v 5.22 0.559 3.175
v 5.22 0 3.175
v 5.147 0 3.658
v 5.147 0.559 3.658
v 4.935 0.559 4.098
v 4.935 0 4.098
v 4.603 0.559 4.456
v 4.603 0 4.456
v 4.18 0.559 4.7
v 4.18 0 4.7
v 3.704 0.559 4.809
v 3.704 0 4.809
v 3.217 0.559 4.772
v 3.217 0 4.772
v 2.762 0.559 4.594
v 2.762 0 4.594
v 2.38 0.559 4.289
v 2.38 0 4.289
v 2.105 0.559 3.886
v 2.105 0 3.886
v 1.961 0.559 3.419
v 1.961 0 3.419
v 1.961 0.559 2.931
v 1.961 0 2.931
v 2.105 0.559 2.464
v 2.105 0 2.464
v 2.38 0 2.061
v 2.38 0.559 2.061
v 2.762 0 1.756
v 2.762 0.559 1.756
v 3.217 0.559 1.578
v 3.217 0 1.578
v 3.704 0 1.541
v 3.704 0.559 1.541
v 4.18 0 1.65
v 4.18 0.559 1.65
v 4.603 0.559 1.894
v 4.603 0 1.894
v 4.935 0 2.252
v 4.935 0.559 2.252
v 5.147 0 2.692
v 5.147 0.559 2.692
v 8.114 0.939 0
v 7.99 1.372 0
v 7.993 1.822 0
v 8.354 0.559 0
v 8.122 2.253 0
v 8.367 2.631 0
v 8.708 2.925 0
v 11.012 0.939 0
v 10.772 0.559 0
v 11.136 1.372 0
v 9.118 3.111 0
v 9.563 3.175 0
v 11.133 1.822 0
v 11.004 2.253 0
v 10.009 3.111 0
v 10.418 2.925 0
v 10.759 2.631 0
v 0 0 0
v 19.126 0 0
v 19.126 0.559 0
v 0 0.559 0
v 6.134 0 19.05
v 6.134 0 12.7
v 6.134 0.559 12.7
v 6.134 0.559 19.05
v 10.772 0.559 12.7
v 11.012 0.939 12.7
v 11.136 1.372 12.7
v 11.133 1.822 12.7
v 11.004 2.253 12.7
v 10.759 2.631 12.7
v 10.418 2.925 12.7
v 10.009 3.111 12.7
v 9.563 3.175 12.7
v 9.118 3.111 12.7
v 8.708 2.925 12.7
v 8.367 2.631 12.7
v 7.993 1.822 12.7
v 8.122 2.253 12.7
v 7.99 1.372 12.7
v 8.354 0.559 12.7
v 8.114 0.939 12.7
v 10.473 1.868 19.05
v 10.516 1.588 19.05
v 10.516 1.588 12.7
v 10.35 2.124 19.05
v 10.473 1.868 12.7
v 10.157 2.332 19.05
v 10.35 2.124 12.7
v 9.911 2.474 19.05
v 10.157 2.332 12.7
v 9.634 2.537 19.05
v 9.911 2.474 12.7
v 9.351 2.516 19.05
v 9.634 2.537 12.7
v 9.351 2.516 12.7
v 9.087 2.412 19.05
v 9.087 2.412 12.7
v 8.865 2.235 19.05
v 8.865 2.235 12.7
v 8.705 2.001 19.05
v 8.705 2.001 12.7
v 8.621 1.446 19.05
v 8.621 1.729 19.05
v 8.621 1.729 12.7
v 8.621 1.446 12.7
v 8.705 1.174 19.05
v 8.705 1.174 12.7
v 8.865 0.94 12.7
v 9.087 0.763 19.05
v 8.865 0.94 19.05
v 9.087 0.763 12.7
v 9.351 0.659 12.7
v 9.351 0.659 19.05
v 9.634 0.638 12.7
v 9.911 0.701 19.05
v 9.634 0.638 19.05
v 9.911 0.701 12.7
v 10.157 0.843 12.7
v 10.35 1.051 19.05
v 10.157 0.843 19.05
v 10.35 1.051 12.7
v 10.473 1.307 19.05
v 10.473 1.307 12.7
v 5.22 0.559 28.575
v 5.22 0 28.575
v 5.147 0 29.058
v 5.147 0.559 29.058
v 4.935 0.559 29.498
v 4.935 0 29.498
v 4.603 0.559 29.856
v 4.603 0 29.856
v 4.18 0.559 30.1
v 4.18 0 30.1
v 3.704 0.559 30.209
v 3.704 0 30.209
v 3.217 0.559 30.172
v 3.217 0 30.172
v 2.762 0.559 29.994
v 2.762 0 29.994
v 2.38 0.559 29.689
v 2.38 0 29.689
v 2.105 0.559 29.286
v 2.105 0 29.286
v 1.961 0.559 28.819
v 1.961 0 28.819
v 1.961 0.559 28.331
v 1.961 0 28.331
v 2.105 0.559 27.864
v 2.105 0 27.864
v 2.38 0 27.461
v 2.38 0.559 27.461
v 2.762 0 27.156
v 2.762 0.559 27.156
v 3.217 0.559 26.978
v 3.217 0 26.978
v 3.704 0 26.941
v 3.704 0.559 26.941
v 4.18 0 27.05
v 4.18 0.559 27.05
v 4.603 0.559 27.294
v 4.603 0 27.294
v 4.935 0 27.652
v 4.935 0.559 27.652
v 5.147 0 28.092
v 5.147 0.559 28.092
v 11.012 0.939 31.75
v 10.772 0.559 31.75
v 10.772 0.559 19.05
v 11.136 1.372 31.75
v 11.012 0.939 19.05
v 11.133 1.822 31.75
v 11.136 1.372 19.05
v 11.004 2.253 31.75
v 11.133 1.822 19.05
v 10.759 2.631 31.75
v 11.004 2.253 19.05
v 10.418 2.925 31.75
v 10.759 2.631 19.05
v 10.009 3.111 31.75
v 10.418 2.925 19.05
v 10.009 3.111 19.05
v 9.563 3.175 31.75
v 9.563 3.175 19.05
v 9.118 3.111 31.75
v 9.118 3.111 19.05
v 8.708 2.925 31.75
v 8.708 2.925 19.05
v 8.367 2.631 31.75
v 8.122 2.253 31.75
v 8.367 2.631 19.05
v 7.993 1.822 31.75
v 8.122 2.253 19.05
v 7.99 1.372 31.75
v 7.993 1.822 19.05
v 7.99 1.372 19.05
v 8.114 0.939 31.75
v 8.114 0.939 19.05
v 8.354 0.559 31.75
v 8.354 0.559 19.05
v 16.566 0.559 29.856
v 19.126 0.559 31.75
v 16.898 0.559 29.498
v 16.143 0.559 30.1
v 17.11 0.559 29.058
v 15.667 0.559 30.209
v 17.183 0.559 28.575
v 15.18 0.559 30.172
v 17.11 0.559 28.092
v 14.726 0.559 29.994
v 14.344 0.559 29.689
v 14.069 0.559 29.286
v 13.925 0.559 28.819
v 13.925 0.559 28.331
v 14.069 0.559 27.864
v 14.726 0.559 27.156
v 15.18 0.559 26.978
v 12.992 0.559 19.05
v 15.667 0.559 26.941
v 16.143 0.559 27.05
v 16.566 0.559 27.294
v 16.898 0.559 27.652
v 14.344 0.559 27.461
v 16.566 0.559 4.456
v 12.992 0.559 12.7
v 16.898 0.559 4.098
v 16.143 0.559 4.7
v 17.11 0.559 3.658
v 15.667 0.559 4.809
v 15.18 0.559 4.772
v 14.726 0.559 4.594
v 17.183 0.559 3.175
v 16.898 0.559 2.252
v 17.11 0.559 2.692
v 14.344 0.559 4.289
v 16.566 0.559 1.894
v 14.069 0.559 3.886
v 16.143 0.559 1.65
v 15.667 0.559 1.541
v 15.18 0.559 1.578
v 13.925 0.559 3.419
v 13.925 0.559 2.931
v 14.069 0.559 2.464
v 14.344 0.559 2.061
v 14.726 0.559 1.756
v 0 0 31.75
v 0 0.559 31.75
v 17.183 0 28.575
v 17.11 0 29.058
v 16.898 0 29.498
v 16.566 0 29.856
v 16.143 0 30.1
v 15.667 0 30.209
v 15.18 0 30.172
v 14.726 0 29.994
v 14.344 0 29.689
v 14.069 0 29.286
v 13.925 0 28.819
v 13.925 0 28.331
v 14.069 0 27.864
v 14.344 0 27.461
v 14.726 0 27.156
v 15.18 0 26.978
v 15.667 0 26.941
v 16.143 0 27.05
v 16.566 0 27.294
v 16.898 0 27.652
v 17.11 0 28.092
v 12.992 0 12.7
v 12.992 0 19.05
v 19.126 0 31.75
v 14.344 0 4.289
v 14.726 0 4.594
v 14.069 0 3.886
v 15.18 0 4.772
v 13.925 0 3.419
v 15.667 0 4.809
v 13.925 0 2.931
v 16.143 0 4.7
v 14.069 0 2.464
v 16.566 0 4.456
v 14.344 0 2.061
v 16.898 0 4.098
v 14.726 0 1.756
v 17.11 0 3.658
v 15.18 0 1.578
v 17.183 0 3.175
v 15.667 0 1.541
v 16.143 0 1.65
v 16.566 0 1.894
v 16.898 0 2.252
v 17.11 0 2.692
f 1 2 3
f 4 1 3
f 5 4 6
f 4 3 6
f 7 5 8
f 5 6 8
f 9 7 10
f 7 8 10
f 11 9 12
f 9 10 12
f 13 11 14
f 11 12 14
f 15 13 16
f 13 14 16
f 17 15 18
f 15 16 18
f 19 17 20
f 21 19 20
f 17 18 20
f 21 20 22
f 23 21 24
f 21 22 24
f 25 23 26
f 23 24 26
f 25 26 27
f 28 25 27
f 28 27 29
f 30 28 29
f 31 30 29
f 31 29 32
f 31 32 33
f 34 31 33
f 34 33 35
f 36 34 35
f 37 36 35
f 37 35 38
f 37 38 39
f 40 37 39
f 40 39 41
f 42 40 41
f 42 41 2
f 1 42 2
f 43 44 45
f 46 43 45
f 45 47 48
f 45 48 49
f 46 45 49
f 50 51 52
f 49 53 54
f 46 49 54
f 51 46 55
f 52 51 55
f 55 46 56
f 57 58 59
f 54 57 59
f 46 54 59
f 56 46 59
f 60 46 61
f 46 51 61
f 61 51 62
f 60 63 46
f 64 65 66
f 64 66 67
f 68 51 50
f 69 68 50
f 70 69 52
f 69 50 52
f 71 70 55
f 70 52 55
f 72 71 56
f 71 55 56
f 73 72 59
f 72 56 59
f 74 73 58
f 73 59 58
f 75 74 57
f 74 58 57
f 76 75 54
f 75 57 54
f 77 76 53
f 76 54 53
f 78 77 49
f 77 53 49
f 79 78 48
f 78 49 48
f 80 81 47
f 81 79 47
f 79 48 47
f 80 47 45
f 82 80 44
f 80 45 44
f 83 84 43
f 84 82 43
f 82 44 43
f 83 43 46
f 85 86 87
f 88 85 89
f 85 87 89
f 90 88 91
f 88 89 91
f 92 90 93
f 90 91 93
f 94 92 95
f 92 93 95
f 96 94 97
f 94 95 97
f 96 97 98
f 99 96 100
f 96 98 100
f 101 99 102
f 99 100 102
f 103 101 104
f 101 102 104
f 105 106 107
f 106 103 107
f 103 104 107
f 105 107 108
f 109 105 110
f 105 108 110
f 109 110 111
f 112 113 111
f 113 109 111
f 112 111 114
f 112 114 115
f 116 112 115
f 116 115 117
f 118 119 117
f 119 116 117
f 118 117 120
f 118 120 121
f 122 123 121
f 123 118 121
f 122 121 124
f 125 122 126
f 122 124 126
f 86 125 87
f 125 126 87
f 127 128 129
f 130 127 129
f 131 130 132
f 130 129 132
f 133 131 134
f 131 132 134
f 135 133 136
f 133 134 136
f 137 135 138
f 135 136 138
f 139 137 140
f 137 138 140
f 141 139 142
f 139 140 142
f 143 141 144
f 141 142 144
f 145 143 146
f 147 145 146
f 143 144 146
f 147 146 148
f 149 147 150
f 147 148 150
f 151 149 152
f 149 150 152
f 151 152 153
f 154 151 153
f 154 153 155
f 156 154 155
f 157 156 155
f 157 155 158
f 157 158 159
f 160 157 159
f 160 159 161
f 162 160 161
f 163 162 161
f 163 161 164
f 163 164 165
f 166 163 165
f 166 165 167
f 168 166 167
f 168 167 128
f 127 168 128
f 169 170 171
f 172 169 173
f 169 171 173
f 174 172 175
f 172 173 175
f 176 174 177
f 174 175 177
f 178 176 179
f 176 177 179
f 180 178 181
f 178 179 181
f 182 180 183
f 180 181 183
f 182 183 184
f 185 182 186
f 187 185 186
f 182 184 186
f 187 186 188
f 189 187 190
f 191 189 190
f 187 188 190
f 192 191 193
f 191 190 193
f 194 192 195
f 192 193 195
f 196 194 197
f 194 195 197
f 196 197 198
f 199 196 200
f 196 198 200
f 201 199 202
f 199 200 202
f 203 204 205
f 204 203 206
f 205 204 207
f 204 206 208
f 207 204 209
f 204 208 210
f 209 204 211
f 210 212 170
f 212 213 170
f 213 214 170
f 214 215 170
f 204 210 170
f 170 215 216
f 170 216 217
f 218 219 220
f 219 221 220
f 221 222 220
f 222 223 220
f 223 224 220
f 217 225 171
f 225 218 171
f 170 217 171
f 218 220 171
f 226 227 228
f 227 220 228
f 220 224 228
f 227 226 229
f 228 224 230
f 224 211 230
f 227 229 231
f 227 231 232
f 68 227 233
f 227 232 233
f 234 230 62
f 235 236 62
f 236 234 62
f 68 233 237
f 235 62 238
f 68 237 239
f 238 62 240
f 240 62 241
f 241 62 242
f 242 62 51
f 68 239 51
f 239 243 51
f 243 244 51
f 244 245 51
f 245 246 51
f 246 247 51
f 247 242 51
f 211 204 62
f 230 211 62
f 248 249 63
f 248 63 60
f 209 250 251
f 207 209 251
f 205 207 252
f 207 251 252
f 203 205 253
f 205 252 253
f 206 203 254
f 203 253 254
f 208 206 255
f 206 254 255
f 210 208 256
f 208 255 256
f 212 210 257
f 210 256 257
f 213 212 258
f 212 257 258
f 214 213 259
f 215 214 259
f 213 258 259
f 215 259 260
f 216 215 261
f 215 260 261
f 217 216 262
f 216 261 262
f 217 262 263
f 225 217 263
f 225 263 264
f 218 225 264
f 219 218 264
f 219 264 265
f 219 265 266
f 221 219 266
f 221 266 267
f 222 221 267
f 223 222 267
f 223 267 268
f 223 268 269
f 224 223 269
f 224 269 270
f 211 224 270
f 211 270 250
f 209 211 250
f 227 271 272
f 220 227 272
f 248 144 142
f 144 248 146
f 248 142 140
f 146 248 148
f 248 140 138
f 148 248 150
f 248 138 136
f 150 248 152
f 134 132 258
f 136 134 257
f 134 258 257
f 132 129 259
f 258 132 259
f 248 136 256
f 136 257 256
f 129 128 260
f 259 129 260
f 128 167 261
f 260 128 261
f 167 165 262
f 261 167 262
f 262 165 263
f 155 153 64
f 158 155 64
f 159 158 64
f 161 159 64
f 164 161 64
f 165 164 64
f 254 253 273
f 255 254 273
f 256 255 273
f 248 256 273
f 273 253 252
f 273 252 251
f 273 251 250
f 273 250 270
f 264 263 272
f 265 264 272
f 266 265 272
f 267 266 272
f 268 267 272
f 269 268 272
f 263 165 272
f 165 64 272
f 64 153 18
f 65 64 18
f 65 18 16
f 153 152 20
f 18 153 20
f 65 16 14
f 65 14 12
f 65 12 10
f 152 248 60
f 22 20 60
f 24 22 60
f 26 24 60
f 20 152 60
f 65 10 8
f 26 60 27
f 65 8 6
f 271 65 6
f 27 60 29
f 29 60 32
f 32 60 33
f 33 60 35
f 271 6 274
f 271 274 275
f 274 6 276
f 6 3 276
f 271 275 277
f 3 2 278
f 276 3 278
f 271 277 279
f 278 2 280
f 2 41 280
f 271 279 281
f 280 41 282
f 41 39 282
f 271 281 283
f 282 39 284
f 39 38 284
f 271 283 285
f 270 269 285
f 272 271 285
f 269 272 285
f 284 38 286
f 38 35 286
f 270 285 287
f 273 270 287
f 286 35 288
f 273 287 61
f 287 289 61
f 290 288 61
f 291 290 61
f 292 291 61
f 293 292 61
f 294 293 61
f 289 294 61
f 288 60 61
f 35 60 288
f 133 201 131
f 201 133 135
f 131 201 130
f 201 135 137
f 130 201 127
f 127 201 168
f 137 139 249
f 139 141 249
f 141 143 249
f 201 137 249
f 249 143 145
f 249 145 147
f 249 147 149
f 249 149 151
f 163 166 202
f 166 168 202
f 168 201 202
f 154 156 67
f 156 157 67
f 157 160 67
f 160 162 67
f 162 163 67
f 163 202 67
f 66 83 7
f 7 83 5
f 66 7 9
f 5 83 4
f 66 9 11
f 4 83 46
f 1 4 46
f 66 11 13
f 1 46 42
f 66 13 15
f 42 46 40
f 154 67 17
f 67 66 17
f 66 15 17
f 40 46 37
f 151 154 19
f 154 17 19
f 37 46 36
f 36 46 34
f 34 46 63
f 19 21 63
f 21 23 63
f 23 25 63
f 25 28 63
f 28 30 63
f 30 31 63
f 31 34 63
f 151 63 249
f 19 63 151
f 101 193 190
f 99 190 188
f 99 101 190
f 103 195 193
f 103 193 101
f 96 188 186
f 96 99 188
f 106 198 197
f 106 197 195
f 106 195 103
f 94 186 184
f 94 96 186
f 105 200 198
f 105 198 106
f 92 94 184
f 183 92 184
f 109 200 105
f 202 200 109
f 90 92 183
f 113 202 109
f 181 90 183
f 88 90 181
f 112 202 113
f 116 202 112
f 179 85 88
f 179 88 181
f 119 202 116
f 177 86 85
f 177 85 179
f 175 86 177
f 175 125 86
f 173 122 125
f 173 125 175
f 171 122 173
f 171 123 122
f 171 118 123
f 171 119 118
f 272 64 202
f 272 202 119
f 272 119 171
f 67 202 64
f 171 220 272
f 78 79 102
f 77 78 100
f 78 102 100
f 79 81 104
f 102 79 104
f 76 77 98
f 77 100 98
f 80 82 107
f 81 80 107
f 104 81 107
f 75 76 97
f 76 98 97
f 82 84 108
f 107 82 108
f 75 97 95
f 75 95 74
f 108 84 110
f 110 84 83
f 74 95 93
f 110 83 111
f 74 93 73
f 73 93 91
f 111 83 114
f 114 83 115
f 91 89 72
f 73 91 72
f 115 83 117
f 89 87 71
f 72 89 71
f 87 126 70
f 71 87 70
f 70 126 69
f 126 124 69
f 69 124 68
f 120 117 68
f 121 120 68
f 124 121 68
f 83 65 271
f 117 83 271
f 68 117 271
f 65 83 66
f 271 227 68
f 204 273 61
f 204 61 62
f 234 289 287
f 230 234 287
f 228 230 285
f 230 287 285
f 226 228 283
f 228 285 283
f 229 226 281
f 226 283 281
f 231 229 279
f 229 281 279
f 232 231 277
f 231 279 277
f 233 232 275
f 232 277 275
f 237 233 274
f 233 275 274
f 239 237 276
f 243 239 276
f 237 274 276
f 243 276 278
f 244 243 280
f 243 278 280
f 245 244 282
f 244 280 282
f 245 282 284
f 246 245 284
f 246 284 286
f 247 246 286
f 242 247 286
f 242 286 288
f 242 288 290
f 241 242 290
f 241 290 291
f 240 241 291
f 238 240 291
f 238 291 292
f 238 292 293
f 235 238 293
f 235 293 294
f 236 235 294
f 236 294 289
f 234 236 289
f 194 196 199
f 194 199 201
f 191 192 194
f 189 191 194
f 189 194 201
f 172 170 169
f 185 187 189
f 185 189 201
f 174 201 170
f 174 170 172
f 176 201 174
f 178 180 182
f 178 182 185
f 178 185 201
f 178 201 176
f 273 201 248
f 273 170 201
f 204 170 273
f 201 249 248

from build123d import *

# Parameters (mm, degrees)
BOSS_EXTRUDE1_DEPTH = 31.75
SKETCH3_W           = 6.858
SKETCH3_H           = 6.35
SKETCH3_R           = 1.6383
CUT_EXTRUDE1_DEPTH  = 4.175
BOSS_EXTRUDE2_REACH = 21.05
SKETCH4_R           = 0.9525


with BuildPart() as part:
    # Sketch1 → Boss-Extrude1 (new body)
    with BuildSketch(Plane.XY):
        with BuildLine():
            Line((0, 0), (19.1262, 0))
            Line((19.1262, 0), (19.1262, 0.5588))
            Line((19.1262, 0.5588), (10.772204032, 0.5588))
            ThreePointArc((10.772204032, 0.5588), (9.5631, 3.175), (8.353995968, 0.5588))
            Line((8.353995968, 0.5588), (0, 0.5588))
            Line((0, 0.5588), (0, 0))
        make_face()
    extrude(amount=BOSS_EXTRUDE1_DEPTH)

    # Sketch3 → Cut-Extrude1 (cut, through all)
    with BuildSketch(Plane.XZ):
        with Locations((9.5631, 15.875)):
            Rectangle(SKETCH3_W, SKETCH3_H)
        with Locations((3.5814, 28.575)):
            Circle(SKETCH3_R)
        with Locations((15.5448, 28.575)):
            Circle(SKETCH3_R)
        with Locations((15.5448, 3.175)):
            Circle(SKETCH3_R)
        with Locations((3.5814, 3.175)):
            Circle(SKETCH3_R)
    extrude(amount=-CUT_EXTRUDE1_DEPTH, mode=Mode.SUBTRACT)

    # Sketch4 → Boss-Extrude2 (add, up to next)
    with BuildSketch(Plane.XY.offset(12.7), mode=Mode.PRIVATE) as boss_extrude2_sk1:
        with Locations((9.5631, 1.5875)):
            Circle(SKETCH4_R)
    boss_extrude2_tool1 = extrude(boss_extrude2_sk1.sketch, amount=BOSS_EXTRUDE2_REACH, mode=Mode.PRIVATE) - part.part
    add(boss_extrude2_tool1.solids().sort_by_distance((9.5631, 1.5875, 12.7))[0])


solid = part.part
